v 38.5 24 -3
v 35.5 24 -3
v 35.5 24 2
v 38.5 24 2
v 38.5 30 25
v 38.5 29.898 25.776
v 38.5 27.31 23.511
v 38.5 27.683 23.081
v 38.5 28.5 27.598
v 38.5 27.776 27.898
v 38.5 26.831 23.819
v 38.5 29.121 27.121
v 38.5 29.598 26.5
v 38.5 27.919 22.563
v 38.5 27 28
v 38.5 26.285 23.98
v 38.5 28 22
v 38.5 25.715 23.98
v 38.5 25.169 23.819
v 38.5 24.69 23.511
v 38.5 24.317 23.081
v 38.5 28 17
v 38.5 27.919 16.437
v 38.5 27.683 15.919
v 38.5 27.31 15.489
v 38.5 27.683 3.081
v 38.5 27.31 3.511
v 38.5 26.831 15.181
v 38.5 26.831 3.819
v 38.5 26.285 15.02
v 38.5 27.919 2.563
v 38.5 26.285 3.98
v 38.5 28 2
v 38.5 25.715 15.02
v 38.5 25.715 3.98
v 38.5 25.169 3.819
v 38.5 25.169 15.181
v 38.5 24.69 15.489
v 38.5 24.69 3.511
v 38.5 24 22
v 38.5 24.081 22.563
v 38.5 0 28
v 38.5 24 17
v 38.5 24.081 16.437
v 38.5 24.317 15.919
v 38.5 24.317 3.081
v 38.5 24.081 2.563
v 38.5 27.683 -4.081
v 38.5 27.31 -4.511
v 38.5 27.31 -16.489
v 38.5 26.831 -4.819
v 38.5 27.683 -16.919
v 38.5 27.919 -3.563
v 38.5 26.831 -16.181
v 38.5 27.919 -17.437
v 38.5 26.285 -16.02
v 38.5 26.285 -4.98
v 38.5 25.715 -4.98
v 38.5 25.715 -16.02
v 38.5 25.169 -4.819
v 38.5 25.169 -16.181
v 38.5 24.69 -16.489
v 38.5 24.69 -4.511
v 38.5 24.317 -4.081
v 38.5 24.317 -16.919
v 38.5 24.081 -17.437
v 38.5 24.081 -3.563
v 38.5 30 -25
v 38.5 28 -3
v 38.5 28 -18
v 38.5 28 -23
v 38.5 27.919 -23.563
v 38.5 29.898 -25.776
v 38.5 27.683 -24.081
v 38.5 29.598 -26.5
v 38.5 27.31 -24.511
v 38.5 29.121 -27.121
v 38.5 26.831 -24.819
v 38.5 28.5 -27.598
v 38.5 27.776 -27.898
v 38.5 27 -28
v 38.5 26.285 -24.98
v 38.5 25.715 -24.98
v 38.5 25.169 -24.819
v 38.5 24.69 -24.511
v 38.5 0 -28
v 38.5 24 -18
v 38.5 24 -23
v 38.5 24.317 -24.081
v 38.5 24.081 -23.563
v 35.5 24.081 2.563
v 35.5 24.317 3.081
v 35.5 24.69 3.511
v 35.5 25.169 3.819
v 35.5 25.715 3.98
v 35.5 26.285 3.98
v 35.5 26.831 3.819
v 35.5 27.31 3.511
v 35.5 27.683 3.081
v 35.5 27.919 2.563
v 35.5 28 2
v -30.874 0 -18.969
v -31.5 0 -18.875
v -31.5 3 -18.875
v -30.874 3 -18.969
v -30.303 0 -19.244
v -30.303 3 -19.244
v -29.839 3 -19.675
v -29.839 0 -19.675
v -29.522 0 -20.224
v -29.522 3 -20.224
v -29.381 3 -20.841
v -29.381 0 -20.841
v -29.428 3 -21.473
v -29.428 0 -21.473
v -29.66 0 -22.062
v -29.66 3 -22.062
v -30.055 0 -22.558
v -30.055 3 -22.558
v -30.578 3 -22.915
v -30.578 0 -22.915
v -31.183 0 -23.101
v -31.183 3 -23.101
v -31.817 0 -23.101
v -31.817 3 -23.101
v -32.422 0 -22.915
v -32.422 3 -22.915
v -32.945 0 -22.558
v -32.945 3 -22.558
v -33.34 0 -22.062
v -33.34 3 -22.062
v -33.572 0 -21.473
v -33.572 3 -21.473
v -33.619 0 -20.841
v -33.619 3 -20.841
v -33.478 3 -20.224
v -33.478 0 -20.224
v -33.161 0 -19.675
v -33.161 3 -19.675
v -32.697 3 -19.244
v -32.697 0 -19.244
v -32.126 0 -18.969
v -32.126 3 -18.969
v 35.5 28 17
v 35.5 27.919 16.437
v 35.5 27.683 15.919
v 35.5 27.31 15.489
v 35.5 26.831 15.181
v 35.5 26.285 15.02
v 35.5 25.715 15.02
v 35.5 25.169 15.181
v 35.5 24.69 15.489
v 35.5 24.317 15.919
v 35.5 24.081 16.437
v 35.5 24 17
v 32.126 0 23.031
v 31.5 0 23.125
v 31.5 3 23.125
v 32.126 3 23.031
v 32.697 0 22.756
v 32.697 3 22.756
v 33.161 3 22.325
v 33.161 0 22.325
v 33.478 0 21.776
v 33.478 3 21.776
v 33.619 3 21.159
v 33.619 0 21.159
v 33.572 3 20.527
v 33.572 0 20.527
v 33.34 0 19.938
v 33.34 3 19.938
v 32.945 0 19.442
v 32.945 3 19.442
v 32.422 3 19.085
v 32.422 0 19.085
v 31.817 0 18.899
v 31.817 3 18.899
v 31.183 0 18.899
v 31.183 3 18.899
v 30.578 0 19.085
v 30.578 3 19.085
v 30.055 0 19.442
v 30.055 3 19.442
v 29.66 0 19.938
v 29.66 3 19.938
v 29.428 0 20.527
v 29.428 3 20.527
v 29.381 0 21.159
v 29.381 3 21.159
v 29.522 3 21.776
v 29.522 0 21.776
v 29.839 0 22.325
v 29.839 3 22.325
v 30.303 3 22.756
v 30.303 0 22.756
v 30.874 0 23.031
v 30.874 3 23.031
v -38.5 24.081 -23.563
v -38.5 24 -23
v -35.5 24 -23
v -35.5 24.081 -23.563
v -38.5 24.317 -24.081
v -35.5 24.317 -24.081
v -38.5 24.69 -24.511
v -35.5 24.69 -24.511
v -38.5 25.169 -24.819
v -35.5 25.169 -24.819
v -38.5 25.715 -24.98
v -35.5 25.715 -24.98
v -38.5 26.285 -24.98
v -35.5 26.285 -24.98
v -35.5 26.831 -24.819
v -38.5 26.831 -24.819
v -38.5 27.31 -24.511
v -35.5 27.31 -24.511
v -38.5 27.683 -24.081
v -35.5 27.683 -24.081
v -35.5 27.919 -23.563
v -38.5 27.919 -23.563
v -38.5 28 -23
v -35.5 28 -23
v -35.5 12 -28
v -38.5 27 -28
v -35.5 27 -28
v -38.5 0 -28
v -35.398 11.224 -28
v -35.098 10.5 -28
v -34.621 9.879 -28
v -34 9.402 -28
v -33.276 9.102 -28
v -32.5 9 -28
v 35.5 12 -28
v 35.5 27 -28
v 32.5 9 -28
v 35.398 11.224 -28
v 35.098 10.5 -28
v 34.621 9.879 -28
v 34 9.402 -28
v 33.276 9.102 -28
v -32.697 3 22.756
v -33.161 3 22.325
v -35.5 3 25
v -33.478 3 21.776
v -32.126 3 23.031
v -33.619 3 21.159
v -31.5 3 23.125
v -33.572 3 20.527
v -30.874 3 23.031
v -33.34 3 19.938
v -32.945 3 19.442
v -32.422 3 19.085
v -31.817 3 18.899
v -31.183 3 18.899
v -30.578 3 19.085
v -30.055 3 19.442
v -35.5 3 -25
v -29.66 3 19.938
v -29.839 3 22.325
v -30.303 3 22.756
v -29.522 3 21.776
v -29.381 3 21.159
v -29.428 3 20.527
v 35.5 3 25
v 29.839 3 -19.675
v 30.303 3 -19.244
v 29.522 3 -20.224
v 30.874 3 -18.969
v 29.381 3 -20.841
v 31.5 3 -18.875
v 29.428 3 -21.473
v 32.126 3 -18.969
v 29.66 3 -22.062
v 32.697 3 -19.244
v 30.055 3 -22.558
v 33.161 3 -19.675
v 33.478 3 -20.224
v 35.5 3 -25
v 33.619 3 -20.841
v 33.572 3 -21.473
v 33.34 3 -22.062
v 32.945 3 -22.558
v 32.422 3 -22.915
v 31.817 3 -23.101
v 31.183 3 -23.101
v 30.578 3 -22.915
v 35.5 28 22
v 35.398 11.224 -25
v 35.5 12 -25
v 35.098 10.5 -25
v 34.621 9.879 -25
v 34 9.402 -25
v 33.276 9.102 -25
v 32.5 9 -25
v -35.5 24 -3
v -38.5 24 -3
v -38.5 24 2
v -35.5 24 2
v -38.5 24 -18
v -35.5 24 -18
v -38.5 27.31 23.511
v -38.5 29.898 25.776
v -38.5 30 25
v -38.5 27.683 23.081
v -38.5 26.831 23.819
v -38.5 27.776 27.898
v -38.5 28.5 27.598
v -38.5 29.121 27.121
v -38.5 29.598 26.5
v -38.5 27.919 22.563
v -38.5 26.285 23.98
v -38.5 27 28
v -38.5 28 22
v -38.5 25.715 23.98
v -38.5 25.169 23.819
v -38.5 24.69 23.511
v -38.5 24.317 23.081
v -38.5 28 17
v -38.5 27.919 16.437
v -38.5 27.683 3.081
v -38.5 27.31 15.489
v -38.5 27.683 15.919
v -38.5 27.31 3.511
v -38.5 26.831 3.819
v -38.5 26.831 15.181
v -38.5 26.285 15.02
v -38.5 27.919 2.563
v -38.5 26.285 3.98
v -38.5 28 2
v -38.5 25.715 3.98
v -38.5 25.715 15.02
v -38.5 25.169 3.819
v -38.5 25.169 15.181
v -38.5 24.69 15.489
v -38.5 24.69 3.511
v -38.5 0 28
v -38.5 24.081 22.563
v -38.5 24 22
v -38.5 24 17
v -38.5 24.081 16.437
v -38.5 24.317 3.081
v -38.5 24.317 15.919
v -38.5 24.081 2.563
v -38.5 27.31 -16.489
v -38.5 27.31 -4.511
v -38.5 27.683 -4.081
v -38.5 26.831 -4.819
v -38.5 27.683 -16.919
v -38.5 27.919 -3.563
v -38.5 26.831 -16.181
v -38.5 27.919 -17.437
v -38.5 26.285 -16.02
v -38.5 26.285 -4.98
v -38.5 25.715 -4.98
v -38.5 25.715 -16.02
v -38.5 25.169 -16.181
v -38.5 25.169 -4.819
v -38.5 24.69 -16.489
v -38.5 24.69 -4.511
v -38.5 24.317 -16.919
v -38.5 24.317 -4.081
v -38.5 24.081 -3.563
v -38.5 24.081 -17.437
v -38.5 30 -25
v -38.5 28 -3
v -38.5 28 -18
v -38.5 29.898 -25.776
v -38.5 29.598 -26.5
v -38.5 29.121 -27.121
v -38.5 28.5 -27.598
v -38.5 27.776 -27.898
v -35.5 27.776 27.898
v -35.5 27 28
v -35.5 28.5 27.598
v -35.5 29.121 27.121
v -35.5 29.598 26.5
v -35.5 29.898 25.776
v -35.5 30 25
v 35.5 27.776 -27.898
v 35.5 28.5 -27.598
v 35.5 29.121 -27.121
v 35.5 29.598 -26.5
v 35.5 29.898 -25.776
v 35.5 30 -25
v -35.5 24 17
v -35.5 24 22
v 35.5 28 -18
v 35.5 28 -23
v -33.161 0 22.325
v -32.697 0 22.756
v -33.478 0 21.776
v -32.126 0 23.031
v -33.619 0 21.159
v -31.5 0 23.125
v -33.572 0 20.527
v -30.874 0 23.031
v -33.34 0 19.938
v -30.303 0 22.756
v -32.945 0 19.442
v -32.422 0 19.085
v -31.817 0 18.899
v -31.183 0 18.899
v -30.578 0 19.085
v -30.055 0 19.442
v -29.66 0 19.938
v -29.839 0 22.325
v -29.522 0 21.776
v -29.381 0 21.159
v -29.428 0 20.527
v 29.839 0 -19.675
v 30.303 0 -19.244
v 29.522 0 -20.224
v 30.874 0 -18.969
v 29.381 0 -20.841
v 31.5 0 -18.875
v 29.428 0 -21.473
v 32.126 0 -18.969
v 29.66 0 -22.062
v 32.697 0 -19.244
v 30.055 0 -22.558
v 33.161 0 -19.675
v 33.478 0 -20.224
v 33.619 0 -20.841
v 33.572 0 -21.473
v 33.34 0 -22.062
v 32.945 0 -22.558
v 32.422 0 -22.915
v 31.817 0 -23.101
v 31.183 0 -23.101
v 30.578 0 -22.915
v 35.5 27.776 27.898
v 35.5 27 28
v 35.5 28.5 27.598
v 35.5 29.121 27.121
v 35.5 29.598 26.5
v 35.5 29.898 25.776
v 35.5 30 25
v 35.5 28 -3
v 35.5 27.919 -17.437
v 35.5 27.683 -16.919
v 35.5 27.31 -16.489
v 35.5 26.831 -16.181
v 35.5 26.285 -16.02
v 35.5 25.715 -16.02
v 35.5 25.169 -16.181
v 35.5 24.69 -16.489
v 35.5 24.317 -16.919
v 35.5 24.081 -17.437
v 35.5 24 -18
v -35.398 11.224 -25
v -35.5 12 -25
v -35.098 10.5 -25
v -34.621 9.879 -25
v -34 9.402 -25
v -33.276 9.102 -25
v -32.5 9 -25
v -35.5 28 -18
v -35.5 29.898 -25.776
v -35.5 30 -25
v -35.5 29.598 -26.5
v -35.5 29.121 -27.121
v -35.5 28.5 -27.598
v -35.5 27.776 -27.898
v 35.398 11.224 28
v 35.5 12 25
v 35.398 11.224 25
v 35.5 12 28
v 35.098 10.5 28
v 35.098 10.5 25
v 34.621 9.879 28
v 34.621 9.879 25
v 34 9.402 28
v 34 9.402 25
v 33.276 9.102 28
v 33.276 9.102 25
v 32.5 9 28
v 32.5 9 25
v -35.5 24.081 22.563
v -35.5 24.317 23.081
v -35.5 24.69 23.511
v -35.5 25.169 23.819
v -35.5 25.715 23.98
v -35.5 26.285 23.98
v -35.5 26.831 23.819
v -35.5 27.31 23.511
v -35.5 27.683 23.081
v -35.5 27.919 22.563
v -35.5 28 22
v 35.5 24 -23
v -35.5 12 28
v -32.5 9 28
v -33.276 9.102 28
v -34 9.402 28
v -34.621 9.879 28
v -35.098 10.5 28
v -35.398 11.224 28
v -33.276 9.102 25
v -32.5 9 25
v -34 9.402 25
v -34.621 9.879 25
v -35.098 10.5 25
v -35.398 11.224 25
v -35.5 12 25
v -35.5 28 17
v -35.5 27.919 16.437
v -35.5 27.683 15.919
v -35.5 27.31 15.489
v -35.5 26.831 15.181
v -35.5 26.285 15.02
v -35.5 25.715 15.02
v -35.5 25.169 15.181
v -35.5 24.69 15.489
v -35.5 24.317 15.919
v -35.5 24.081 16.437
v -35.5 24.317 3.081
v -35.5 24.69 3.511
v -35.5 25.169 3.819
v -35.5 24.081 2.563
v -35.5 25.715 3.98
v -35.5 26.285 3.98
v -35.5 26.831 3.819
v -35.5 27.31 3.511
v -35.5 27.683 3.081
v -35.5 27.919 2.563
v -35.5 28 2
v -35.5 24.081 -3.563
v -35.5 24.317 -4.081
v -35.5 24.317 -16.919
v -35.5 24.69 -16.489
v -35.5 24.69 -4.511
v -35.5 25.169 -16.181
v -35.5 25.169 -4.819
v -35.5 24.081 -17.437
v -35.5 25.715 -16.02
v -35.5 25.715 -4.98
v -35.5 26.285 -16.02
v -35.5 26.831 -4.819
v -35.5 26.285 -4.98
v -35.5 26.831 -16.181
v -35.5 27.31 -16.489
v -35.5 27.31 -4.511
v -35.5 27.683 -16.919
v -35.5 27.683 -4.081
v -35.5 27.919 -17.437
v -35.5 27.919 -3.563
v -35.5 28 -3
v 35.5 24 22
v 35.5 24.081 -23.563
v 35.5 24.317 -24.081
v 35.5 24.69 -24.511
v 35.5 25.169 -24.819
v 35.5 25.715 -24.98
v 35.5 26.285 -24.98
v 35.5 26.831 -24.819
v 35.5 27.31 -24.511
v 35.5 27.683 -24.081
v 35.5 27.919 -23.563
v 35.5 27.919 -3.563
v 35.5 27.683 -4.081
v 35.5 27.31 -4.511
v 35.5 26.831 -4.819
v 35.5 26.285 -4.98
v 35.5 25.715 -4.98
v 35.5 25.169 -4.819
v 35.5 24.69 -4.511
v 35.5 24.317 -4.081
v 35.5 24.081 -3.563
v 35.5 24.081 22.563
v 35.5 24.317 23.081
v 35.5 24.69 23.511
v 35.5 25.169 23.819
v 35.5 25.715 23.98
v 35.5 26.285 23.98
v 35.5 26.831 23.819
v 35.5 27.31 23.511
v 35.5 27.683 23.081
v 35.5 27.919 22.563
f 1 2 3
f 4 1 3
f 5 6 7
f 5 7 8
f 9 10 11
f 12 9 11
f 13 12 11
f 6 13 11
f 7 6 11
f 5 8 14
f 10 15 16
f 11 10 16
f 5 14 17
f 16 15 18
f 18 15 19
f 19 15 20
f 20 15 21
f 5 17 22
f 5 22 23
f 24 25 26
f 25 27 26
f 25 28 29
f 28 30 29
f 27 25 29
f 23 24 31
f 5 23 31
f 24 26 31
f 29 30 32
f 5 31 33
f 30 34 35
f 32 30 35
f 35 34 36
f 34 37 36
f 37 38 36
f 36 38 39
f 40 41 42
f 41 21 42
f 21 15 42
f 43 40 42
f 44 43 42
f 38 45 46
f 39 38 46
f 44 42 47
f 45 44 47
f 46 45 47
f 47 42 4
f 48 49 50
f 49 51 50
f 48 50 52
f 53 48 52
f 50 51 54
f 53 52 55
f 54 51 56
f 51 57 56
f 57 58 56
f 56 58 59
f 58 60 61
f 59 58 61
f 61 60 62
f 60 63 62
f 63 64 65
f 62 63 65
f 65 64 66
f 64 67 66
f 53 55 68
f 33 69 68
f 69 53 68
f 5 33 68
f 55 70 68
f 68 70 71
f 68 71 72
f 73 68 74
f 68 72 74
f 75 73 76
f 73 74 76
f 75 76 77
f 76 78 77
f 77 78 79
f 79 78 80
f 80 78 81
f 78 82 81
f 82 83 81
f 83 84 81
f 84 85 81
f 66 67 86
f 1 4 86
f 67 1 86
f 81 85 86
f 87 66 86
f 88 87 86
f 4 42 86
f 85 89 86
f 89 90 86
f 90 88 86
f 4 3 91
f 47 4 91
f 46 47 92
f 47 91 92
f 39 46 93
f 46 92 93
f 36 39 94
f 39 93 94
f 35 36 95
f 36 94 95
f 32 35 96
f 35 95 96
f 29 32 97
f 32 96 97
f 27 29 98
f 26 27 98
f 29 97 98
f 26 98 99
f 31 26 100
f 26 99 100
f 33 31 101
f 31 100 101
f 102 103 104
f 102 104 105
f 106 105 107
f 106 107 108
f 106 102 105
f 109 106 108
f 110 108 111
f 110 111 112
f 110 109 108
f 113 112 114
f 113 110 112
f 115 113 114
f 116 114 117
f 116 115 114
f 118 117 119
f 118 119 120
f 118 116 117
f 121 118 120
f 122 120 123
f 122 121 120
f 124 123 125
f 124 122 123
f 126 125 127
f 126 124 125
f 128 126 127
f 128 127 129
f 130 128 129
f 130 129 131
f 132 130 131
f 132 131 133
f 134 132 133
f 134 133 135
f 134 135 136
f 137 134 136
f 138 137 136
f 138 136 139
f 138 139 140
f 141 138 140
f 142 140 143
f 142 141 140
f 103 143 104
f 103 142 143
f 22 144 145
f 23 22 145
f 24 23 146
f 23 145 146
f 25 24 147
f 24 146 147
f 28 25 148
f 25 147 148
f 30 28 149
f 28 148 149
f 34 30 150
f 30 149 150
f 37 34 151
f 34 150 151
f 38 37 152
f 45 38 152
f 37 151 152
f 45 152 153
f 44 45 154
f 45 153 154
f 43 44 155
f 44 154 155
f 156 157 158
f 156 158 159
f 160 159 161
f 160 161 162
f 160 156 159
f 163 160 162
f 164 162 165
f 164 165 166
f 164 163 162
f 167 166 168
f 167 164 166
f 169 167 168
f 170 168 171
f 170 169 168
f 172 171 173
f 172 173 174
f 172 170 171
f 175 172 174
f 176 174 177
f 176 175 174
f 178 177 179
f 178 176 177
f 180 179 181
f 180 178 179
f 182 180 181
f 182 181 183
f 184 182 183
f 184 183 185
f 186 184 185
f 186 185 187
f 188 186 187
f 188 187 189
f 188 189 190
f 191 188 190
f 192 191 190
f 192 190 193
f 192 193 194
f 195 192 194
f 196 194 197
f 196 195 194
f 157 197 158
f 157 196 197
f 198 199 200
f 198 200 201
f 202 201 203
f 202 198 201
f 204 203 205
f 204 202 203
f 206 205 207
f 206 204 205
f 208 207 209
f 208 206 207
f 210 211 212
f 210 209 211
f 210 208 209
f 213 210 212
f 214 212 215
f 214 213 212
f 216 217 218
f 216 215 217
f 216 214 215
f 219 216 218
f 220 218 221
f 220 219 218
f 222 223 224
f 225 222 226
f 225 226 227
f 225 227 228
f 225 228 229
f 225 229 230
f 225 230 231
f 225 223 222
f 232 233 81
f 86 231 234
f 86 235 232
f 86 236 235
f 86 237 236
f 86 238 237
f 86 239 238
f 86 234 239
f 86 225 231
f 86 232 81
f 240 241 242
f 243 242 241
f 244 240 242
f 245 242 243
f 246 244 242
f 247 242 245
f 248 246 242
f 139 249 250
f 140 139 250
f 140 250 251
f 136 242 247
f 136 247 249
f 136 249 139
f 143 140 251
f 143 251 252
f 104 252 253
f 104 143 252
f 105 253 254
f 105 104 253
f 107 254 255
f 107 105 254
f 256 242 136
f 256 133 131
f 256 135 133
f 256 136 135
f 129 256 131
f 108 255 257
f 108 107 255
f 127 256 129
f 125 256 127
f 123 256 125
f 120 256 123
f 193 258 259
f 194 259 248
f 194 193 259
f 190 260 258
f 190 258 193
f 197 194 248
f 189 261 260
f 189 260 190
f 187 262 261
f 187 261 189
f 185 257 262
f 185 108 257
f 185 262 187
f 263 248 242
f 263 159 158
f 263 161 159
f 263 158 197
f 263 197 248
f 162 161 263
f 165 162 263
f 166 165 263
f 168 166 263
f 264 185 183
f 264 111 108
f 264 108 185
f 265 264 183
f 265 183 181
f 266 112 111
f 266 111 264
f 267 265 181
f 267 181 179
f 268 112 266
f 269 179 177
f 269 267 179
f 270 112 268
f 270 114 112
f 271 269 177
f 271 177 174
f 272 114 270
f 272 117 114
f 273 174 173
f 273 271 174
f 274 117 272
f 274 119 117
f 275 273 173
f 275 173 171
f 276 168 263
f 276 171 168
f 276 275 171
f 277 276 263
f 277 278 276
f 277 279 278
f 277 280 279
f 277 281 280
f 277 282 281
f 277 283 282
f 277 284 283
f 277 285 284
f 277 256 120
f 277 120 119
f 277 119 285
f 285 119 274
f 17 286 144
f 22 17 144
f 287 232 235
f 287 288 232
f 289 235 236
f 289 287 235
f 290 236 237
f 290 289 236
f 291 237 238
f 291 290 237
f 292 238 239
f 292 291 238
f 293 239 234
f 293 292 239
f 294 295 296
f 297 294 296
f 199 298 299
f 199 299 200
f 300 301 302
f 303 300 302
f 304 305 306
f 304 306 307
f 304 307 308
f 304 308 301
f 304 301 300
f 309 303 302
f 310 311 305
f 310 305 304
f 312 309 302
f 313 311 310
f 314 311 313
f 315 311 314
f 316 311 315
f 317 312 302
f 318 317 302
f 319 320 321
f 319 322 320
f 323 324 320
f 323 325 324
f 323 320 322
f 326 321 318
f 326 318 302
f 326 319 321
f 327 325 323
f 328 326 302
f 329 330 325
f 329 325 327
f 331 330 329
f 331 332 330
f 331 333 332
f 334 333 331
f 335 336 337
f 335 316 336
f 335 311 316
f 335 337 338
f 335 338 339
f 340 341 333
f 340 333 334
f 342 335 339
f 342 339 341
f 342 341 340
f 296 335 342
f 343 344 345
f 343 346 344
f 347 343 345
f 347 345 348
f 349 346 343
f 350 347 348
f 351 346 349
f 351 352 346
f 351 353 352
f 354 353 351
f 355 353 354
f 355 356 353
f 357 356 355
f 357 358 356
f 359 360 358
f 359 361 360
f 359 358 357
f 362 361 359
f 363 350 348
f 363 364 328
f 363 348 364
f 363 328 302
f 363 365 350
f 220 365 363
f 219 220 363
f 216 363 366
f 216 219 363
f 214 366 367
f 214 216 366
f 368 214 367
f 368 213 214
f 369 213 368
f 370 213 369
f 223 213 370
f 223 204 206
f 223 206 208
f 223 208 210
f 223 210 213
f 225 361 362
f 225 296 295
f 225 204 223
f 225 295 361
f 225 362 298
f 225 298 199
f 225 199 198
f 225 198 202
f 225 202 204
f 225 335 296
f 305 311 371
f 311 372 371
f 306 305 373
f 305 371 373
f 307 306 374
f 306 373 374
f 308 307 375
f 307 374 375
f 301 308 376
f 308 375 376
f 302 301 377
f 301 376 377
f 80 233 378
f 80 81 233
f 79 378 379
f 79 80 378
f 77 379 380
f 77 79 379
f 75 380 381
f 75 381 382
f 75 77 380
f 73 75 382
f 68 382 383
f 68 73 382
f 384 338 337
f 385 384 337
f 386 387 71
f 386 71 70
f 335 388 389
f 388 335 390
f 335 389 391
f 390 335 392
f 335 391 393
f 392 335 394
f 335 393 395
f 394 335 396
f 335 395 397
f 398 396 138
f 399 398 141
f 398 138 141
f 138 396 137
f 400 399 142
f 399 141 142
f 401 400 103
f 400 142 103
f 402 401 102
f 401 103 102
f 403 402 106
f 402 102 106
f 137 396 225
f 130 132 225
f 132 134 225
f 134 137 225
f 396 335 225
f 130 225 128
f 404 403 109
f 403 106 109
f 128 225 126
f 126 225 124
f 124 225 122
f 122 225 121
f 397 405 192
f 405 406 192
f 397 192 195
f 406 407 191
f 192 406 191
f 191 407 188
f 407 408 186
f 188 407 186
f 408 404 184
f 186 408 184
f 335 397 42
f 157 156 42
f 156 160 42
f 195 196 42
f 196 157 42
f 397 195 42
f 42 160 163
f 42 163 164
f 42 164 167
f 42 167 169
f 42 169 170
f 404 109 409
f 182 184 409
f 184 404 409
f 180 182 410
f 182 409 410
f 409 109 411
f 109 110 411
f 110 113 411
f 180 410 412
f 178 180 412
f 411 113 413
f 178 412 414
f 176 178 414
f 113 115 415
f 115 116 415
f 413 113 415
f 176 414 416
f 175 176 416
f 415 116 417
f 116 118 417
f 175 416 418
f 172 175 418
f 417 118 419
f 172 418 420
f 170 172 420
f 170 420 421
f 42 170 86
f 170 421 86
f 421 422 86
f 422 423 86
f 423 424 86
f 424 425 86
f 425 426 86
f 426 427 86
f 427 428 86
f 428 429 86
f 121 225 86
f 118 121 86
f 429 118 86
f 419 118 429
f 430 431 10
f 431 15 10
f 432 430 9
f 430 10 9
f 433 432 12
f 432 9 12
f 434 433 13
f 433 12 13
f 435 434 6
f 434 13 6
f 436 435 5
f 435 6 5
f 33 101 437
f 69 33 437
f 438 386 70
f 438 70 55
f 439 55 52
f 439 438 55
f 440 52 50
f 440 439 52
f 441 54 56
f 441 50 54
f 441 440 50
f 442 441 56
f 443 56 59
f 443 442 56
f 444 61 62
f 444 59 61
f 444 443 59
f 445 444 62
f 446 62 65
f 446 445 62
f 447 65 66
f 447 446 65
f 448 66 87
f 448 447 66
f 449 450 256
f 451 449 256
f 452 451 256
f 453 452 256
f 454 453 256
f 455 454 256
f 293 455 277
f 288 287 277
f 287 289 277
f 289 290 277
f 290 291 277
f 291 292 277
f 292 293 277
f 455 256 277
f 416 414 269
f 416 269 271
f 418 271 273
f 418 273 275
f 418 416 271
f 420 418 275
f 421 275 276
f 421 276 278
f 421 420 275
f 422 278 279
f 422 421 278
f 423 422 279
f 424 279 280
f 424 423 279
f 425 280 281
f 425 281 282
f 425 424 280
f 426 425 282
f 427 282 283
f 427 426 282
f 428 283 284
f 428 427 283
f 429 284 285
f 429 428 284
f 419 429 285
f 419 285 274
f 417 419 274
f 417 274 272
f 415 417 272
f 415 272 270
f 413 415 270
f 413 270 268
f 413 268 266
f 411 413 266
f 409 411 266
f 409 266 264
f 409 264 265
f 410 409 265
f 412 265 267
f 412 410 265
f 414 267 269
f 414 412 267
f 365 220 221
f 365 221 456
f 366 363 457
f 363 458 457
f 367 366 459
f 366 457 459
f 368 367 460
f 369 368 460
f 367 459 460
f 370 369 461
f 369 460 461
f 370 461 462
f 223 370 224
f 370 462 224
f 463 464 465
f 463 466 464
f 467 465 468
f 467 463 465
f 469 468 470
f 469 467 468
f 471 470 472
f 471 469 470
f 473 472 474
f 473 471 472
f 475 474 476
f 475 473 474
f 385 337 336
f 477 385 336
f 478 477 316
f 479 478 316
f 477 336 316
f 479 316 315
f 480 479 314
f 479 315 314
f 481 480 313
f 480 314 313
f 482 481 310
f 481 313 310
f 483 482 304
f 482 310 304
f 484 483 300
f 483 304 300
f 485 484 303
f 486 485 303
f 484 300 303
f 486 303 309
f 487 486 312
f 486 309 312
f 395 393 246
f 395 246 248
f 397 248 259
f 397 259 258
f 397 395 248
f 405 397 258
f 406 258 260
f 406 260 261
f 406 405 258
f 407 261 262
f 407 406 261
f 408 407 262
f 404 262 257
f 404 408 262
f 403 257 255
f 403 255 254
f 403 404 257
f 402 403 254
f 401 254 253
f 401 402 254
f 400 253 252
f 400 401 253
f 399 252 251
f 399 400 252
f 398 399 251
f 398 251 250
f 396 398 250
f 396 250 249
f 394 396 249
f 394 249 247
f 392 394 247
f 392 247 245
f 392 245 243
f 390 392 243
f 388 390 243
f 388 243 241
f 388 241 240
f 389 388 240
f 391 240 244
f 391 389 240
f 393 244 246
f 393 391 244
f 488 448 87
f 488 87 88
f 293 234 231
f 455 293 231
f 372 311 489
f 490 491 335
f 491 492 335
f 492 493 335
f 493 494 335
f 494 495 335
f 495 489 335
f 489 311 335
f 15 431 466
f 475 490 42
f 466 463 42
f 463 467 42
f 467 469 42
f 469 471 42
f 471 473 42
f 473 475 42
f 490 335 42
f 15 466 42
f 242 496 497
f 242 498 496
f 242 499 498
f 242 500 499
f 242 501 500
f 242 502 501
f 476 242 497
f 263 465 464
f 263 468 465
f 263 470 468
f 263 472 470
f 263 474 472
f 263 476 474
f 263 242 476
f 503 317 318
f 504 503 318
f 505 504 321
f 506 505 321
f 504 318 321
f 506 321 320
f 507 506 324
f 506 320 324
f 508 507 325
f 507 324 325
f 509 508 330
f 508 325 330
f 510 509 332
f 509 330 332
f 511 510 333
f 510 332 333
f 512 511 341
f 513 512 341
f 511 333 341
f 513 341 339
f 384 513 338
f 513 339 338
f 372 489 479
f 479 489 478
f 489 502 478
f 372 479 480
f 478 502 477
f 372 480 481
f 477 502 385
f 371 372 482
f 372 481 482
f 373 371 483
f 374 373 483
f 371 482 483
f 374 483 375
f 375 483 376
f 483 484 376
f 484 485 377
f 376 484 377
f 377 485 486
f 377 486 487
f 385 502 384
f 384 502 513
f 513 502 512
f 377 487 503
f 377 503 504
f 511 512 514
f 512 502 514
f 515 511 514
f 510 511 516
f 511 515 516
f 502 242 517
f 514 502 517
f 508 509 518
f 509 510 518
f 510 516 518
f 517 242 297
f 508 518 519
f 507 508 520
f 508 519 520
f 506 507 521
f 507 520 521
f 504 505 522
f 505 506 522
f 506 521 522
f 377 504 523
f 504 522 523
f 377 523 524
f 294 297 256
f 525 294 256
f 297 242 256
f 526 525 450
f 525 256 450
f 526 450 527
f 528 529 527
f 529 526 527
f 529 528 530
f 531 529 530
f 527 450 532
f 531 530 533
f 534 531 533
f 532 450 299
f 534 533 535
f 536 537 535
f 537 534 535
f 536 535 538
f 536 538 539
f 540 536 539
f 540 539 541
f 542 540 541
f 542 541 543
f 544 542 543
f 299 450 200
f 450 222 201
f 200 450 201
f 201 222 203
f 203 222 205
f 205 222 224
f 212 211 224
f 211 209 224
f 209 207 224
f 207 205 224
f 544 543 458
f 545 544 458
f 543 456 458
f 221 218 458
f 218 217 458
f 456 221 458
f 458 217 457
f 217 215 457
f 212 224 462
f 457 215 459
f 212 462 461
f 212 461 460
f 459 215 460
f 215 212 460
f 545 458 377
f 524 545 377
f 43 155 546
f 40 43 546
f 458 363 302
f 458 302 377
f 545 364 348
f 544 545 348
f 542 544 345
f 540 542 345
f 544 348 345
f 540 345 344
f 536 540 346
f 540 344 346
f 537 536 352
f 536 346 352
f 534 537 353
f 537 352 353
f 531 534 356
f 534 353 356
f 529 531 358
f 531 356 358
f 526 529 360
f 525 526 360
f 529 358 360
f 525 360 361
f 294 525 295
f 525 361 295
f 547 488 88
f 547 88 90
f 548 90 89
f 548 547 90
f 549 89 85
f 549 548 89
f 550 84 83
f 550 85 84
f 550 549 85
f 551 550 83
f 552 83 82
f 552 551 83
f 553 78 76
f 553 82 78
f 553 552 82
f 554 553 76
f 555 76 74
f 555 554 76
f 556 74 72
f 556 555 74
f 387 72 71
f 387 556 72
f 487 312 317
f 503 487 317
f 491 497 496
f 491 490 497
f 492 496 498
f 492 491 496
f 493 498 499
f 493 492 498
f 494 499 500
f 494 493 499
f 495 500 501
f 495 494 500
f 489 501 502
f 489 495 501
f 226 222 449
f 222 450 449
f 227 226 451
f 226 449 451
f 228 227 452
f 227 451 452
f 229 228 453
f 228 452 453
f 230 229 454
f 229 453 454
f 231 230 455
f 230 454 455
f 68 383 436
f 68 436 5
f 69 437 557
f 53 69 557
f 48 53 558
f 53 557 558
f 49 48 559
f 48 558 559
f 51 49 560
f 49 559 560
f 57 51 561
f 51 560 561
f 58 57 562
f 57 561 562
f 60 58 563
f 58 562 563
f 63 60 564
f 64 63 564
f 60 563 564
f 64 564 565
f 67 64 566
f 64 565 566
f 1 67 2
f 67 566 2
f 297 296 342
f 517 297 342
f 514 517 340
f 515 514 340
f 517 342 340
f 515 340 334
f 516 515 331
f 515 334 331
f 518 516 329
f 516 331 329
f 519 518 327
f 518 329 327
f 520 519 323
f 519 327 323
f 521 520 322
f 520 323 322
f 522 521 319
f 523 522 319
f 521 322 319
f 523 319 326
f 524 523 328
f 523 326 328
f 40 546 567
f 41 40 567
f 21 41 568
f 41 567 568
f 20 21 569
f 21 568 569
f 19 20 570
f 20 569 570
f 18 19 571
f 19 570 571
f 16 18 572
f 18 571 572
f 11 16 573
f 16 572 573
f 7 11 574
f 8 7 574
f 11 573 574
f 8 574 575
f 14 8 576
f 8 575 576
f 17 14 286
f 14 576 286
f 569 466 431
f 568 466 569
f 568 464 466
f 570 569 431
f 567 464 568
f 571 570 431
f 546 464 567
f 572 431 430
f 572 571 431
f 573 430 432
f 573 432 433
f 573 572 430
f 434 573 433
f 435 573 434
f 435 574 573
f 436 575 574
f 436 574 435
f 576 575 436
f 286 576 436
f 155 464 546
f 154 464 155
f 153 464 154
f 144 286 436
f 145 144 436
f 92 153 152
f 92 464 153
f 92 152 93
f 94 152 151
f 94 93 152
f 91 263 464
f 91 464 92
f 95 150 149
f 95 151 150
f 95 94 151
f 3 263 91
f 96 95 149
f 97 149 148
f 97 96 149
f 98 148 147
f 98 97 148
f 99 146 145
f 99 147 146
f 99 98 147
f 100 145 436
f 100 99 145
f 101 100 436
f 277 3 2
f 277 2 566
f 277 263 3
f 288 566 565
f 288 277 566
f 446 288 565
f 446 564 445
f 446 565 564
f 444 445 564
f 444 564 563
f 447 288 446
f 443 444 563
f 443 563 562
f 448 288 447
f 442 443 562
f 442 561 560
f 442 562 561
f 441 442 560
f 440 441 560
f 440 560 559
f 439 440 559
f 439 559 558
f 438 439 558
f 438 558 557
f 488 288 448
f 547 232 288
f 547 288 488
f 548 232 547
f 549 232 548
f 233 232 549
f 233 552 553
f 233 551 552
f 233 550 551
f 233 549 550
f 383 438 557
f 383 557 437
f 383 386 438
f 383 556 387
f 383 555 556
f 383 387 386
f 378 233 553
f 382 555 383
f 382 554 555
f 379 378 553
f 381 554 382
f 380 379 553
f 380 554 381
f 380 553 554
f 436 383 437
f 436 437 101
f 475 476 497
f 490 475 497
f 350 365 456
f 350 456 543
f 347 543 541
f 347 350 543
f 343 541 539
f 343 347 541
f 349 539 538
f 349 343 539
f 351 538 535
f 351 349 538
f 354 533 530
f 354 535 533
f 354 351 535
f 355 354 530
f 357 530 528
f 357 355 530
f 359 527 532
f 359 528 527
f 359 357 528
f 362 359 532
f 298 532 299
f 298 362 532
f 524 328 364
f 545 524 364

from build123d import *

# Parameters (mm, degrees)
SKETCH1_W           = 71
SKETCH1_H           = 50
SKETCH1_R           = 2.125
BOSS_EXTRUDE1_DEPTH = 3
SKETCH2_W           = 77
SKETCH2_H           = 56
SKETCH2_W_2         = 71
SKETCH2_H_2         = 50
BOSS_EXTRUDE2_DEPTH = 30
SKETCH3_W           = 71
SKETCH3_H           = 30
CUT_EXTRUDE1_DEPTH  = 75.284924446
CUT_EXTRUDE2_DEPTH  = 88.252507127
FILLET1_R           = 3


with BuildPart() as part:
    # Sketch1 → Boss-Extrude1 (new body)
    with BuildSketch(Plane(origin=(0, 0, 0), x_dir=(1, 0, 0), z_dir=(0, 1, 0))):
        Rectangle(SKETCH1_W, SKETCH1_H)
        with Locations(Location((-31.5, 21, 0), (0, 0, 270))):
            Circle(SKETCH1_R, mode=Mode.SUBTRACT)
        with Locations(Location((31.5, 21, 0), (0, 0, 270))):
            Circle(SKETCH1_R, mode=Mode.SUBTRACT)
        with Locations(Location((31.5, -21, 0), (0, 0, 270))):
            Circle(SKETCH1_R, mode=Mode.SUBTRACT)
        with Locations(Location((-31.5, -21, 0), (0, 0, 270))):
            Circle(SKETCH1_R, mode=Mode.SUBTRACT)
    extrude(amount=BOSS_EXTRUDE1_DEPTH)

    # Sketch2 → Boss-Extrude2 (add)
    with BuildSketch(Plane(origin=(0, 0, 0), x_dir=(1, 0, 0), z_dir=(0, 1, 0))):
        Rectangle(SKETCH2_W, SKETCH2_H)
        Rectangle(SKETCH2_W_2, SKETCH2_H_2, mode=Mode.SUBTRACT)
    extrude(amount=BOSS_EXTRUDE2_DEPTH)

    # Sketch3 → Cut-Extrude1 (cut, through all)
    with BuildSketch(Plane(origin=(0, 0, -28), x_dir=(-1, 0, 0), z_dir=(0, 0, -1))):
        with Locations((0, 24)):
            Rectangle(SKETCH3_W, SKETCH3_H)
    extrude(amount=-CUT_EXTRUDE1_DEPTH, mode=Mode.SUBTRACT)

    # Sketch4 → Cut-Extrude2 (cut, through all)
    with BuildSketch(Plane.ZY.offset(38.5)):
        with BuildLine():
            Line((-18, 24), (-23, 24))
            ThreePointArc((-23, 24), (-25, 26), (-23, 28))
            Line((-23, 28), (-18, 28))
            ThreePointArc((-18, 28), (-16, 26), (-18, 24))
        make_face()
        with BuildLine():
            Line((2, 28), (-3, 28))
            ThreePointArc((-3, 28), (-5, 26), (-3, 24))
            Line((-3, 24), (2, 24))
            ThreePointArc((2, 24), (4, 26), (2, 28))
        make_face()
        with BuildLine():
            Line((22, 28), (17, 28))
            ThreePointArc((17, 28), (15, 26), (17, 24))
            Line((17, 24), (22, 24))
            ThreePointArc((22, 24), (24, 26), (22, 28))
        make_face()
    extrude(amount=-CUT_EXTRUDE2_DEPTH, mode=Mode.SUBTRACT)

    # Fillet1
    fillet1_edges = [part.edges().sort_by_distance(p)[0] for p in [
        (37, 30, -28),
        (-37, 30, 28),
        (37, 30, 28),
        (-37, 30, -28),
        (35.5, 9, -26.5),
        (-35.5, 9, -26.5),
        (35.5, 9, 26.5),
        (-35.5, 9, 26.5),
    ]]
    fillet(fillet1_edges, radius=FILLET1_R)


solid = part.part
